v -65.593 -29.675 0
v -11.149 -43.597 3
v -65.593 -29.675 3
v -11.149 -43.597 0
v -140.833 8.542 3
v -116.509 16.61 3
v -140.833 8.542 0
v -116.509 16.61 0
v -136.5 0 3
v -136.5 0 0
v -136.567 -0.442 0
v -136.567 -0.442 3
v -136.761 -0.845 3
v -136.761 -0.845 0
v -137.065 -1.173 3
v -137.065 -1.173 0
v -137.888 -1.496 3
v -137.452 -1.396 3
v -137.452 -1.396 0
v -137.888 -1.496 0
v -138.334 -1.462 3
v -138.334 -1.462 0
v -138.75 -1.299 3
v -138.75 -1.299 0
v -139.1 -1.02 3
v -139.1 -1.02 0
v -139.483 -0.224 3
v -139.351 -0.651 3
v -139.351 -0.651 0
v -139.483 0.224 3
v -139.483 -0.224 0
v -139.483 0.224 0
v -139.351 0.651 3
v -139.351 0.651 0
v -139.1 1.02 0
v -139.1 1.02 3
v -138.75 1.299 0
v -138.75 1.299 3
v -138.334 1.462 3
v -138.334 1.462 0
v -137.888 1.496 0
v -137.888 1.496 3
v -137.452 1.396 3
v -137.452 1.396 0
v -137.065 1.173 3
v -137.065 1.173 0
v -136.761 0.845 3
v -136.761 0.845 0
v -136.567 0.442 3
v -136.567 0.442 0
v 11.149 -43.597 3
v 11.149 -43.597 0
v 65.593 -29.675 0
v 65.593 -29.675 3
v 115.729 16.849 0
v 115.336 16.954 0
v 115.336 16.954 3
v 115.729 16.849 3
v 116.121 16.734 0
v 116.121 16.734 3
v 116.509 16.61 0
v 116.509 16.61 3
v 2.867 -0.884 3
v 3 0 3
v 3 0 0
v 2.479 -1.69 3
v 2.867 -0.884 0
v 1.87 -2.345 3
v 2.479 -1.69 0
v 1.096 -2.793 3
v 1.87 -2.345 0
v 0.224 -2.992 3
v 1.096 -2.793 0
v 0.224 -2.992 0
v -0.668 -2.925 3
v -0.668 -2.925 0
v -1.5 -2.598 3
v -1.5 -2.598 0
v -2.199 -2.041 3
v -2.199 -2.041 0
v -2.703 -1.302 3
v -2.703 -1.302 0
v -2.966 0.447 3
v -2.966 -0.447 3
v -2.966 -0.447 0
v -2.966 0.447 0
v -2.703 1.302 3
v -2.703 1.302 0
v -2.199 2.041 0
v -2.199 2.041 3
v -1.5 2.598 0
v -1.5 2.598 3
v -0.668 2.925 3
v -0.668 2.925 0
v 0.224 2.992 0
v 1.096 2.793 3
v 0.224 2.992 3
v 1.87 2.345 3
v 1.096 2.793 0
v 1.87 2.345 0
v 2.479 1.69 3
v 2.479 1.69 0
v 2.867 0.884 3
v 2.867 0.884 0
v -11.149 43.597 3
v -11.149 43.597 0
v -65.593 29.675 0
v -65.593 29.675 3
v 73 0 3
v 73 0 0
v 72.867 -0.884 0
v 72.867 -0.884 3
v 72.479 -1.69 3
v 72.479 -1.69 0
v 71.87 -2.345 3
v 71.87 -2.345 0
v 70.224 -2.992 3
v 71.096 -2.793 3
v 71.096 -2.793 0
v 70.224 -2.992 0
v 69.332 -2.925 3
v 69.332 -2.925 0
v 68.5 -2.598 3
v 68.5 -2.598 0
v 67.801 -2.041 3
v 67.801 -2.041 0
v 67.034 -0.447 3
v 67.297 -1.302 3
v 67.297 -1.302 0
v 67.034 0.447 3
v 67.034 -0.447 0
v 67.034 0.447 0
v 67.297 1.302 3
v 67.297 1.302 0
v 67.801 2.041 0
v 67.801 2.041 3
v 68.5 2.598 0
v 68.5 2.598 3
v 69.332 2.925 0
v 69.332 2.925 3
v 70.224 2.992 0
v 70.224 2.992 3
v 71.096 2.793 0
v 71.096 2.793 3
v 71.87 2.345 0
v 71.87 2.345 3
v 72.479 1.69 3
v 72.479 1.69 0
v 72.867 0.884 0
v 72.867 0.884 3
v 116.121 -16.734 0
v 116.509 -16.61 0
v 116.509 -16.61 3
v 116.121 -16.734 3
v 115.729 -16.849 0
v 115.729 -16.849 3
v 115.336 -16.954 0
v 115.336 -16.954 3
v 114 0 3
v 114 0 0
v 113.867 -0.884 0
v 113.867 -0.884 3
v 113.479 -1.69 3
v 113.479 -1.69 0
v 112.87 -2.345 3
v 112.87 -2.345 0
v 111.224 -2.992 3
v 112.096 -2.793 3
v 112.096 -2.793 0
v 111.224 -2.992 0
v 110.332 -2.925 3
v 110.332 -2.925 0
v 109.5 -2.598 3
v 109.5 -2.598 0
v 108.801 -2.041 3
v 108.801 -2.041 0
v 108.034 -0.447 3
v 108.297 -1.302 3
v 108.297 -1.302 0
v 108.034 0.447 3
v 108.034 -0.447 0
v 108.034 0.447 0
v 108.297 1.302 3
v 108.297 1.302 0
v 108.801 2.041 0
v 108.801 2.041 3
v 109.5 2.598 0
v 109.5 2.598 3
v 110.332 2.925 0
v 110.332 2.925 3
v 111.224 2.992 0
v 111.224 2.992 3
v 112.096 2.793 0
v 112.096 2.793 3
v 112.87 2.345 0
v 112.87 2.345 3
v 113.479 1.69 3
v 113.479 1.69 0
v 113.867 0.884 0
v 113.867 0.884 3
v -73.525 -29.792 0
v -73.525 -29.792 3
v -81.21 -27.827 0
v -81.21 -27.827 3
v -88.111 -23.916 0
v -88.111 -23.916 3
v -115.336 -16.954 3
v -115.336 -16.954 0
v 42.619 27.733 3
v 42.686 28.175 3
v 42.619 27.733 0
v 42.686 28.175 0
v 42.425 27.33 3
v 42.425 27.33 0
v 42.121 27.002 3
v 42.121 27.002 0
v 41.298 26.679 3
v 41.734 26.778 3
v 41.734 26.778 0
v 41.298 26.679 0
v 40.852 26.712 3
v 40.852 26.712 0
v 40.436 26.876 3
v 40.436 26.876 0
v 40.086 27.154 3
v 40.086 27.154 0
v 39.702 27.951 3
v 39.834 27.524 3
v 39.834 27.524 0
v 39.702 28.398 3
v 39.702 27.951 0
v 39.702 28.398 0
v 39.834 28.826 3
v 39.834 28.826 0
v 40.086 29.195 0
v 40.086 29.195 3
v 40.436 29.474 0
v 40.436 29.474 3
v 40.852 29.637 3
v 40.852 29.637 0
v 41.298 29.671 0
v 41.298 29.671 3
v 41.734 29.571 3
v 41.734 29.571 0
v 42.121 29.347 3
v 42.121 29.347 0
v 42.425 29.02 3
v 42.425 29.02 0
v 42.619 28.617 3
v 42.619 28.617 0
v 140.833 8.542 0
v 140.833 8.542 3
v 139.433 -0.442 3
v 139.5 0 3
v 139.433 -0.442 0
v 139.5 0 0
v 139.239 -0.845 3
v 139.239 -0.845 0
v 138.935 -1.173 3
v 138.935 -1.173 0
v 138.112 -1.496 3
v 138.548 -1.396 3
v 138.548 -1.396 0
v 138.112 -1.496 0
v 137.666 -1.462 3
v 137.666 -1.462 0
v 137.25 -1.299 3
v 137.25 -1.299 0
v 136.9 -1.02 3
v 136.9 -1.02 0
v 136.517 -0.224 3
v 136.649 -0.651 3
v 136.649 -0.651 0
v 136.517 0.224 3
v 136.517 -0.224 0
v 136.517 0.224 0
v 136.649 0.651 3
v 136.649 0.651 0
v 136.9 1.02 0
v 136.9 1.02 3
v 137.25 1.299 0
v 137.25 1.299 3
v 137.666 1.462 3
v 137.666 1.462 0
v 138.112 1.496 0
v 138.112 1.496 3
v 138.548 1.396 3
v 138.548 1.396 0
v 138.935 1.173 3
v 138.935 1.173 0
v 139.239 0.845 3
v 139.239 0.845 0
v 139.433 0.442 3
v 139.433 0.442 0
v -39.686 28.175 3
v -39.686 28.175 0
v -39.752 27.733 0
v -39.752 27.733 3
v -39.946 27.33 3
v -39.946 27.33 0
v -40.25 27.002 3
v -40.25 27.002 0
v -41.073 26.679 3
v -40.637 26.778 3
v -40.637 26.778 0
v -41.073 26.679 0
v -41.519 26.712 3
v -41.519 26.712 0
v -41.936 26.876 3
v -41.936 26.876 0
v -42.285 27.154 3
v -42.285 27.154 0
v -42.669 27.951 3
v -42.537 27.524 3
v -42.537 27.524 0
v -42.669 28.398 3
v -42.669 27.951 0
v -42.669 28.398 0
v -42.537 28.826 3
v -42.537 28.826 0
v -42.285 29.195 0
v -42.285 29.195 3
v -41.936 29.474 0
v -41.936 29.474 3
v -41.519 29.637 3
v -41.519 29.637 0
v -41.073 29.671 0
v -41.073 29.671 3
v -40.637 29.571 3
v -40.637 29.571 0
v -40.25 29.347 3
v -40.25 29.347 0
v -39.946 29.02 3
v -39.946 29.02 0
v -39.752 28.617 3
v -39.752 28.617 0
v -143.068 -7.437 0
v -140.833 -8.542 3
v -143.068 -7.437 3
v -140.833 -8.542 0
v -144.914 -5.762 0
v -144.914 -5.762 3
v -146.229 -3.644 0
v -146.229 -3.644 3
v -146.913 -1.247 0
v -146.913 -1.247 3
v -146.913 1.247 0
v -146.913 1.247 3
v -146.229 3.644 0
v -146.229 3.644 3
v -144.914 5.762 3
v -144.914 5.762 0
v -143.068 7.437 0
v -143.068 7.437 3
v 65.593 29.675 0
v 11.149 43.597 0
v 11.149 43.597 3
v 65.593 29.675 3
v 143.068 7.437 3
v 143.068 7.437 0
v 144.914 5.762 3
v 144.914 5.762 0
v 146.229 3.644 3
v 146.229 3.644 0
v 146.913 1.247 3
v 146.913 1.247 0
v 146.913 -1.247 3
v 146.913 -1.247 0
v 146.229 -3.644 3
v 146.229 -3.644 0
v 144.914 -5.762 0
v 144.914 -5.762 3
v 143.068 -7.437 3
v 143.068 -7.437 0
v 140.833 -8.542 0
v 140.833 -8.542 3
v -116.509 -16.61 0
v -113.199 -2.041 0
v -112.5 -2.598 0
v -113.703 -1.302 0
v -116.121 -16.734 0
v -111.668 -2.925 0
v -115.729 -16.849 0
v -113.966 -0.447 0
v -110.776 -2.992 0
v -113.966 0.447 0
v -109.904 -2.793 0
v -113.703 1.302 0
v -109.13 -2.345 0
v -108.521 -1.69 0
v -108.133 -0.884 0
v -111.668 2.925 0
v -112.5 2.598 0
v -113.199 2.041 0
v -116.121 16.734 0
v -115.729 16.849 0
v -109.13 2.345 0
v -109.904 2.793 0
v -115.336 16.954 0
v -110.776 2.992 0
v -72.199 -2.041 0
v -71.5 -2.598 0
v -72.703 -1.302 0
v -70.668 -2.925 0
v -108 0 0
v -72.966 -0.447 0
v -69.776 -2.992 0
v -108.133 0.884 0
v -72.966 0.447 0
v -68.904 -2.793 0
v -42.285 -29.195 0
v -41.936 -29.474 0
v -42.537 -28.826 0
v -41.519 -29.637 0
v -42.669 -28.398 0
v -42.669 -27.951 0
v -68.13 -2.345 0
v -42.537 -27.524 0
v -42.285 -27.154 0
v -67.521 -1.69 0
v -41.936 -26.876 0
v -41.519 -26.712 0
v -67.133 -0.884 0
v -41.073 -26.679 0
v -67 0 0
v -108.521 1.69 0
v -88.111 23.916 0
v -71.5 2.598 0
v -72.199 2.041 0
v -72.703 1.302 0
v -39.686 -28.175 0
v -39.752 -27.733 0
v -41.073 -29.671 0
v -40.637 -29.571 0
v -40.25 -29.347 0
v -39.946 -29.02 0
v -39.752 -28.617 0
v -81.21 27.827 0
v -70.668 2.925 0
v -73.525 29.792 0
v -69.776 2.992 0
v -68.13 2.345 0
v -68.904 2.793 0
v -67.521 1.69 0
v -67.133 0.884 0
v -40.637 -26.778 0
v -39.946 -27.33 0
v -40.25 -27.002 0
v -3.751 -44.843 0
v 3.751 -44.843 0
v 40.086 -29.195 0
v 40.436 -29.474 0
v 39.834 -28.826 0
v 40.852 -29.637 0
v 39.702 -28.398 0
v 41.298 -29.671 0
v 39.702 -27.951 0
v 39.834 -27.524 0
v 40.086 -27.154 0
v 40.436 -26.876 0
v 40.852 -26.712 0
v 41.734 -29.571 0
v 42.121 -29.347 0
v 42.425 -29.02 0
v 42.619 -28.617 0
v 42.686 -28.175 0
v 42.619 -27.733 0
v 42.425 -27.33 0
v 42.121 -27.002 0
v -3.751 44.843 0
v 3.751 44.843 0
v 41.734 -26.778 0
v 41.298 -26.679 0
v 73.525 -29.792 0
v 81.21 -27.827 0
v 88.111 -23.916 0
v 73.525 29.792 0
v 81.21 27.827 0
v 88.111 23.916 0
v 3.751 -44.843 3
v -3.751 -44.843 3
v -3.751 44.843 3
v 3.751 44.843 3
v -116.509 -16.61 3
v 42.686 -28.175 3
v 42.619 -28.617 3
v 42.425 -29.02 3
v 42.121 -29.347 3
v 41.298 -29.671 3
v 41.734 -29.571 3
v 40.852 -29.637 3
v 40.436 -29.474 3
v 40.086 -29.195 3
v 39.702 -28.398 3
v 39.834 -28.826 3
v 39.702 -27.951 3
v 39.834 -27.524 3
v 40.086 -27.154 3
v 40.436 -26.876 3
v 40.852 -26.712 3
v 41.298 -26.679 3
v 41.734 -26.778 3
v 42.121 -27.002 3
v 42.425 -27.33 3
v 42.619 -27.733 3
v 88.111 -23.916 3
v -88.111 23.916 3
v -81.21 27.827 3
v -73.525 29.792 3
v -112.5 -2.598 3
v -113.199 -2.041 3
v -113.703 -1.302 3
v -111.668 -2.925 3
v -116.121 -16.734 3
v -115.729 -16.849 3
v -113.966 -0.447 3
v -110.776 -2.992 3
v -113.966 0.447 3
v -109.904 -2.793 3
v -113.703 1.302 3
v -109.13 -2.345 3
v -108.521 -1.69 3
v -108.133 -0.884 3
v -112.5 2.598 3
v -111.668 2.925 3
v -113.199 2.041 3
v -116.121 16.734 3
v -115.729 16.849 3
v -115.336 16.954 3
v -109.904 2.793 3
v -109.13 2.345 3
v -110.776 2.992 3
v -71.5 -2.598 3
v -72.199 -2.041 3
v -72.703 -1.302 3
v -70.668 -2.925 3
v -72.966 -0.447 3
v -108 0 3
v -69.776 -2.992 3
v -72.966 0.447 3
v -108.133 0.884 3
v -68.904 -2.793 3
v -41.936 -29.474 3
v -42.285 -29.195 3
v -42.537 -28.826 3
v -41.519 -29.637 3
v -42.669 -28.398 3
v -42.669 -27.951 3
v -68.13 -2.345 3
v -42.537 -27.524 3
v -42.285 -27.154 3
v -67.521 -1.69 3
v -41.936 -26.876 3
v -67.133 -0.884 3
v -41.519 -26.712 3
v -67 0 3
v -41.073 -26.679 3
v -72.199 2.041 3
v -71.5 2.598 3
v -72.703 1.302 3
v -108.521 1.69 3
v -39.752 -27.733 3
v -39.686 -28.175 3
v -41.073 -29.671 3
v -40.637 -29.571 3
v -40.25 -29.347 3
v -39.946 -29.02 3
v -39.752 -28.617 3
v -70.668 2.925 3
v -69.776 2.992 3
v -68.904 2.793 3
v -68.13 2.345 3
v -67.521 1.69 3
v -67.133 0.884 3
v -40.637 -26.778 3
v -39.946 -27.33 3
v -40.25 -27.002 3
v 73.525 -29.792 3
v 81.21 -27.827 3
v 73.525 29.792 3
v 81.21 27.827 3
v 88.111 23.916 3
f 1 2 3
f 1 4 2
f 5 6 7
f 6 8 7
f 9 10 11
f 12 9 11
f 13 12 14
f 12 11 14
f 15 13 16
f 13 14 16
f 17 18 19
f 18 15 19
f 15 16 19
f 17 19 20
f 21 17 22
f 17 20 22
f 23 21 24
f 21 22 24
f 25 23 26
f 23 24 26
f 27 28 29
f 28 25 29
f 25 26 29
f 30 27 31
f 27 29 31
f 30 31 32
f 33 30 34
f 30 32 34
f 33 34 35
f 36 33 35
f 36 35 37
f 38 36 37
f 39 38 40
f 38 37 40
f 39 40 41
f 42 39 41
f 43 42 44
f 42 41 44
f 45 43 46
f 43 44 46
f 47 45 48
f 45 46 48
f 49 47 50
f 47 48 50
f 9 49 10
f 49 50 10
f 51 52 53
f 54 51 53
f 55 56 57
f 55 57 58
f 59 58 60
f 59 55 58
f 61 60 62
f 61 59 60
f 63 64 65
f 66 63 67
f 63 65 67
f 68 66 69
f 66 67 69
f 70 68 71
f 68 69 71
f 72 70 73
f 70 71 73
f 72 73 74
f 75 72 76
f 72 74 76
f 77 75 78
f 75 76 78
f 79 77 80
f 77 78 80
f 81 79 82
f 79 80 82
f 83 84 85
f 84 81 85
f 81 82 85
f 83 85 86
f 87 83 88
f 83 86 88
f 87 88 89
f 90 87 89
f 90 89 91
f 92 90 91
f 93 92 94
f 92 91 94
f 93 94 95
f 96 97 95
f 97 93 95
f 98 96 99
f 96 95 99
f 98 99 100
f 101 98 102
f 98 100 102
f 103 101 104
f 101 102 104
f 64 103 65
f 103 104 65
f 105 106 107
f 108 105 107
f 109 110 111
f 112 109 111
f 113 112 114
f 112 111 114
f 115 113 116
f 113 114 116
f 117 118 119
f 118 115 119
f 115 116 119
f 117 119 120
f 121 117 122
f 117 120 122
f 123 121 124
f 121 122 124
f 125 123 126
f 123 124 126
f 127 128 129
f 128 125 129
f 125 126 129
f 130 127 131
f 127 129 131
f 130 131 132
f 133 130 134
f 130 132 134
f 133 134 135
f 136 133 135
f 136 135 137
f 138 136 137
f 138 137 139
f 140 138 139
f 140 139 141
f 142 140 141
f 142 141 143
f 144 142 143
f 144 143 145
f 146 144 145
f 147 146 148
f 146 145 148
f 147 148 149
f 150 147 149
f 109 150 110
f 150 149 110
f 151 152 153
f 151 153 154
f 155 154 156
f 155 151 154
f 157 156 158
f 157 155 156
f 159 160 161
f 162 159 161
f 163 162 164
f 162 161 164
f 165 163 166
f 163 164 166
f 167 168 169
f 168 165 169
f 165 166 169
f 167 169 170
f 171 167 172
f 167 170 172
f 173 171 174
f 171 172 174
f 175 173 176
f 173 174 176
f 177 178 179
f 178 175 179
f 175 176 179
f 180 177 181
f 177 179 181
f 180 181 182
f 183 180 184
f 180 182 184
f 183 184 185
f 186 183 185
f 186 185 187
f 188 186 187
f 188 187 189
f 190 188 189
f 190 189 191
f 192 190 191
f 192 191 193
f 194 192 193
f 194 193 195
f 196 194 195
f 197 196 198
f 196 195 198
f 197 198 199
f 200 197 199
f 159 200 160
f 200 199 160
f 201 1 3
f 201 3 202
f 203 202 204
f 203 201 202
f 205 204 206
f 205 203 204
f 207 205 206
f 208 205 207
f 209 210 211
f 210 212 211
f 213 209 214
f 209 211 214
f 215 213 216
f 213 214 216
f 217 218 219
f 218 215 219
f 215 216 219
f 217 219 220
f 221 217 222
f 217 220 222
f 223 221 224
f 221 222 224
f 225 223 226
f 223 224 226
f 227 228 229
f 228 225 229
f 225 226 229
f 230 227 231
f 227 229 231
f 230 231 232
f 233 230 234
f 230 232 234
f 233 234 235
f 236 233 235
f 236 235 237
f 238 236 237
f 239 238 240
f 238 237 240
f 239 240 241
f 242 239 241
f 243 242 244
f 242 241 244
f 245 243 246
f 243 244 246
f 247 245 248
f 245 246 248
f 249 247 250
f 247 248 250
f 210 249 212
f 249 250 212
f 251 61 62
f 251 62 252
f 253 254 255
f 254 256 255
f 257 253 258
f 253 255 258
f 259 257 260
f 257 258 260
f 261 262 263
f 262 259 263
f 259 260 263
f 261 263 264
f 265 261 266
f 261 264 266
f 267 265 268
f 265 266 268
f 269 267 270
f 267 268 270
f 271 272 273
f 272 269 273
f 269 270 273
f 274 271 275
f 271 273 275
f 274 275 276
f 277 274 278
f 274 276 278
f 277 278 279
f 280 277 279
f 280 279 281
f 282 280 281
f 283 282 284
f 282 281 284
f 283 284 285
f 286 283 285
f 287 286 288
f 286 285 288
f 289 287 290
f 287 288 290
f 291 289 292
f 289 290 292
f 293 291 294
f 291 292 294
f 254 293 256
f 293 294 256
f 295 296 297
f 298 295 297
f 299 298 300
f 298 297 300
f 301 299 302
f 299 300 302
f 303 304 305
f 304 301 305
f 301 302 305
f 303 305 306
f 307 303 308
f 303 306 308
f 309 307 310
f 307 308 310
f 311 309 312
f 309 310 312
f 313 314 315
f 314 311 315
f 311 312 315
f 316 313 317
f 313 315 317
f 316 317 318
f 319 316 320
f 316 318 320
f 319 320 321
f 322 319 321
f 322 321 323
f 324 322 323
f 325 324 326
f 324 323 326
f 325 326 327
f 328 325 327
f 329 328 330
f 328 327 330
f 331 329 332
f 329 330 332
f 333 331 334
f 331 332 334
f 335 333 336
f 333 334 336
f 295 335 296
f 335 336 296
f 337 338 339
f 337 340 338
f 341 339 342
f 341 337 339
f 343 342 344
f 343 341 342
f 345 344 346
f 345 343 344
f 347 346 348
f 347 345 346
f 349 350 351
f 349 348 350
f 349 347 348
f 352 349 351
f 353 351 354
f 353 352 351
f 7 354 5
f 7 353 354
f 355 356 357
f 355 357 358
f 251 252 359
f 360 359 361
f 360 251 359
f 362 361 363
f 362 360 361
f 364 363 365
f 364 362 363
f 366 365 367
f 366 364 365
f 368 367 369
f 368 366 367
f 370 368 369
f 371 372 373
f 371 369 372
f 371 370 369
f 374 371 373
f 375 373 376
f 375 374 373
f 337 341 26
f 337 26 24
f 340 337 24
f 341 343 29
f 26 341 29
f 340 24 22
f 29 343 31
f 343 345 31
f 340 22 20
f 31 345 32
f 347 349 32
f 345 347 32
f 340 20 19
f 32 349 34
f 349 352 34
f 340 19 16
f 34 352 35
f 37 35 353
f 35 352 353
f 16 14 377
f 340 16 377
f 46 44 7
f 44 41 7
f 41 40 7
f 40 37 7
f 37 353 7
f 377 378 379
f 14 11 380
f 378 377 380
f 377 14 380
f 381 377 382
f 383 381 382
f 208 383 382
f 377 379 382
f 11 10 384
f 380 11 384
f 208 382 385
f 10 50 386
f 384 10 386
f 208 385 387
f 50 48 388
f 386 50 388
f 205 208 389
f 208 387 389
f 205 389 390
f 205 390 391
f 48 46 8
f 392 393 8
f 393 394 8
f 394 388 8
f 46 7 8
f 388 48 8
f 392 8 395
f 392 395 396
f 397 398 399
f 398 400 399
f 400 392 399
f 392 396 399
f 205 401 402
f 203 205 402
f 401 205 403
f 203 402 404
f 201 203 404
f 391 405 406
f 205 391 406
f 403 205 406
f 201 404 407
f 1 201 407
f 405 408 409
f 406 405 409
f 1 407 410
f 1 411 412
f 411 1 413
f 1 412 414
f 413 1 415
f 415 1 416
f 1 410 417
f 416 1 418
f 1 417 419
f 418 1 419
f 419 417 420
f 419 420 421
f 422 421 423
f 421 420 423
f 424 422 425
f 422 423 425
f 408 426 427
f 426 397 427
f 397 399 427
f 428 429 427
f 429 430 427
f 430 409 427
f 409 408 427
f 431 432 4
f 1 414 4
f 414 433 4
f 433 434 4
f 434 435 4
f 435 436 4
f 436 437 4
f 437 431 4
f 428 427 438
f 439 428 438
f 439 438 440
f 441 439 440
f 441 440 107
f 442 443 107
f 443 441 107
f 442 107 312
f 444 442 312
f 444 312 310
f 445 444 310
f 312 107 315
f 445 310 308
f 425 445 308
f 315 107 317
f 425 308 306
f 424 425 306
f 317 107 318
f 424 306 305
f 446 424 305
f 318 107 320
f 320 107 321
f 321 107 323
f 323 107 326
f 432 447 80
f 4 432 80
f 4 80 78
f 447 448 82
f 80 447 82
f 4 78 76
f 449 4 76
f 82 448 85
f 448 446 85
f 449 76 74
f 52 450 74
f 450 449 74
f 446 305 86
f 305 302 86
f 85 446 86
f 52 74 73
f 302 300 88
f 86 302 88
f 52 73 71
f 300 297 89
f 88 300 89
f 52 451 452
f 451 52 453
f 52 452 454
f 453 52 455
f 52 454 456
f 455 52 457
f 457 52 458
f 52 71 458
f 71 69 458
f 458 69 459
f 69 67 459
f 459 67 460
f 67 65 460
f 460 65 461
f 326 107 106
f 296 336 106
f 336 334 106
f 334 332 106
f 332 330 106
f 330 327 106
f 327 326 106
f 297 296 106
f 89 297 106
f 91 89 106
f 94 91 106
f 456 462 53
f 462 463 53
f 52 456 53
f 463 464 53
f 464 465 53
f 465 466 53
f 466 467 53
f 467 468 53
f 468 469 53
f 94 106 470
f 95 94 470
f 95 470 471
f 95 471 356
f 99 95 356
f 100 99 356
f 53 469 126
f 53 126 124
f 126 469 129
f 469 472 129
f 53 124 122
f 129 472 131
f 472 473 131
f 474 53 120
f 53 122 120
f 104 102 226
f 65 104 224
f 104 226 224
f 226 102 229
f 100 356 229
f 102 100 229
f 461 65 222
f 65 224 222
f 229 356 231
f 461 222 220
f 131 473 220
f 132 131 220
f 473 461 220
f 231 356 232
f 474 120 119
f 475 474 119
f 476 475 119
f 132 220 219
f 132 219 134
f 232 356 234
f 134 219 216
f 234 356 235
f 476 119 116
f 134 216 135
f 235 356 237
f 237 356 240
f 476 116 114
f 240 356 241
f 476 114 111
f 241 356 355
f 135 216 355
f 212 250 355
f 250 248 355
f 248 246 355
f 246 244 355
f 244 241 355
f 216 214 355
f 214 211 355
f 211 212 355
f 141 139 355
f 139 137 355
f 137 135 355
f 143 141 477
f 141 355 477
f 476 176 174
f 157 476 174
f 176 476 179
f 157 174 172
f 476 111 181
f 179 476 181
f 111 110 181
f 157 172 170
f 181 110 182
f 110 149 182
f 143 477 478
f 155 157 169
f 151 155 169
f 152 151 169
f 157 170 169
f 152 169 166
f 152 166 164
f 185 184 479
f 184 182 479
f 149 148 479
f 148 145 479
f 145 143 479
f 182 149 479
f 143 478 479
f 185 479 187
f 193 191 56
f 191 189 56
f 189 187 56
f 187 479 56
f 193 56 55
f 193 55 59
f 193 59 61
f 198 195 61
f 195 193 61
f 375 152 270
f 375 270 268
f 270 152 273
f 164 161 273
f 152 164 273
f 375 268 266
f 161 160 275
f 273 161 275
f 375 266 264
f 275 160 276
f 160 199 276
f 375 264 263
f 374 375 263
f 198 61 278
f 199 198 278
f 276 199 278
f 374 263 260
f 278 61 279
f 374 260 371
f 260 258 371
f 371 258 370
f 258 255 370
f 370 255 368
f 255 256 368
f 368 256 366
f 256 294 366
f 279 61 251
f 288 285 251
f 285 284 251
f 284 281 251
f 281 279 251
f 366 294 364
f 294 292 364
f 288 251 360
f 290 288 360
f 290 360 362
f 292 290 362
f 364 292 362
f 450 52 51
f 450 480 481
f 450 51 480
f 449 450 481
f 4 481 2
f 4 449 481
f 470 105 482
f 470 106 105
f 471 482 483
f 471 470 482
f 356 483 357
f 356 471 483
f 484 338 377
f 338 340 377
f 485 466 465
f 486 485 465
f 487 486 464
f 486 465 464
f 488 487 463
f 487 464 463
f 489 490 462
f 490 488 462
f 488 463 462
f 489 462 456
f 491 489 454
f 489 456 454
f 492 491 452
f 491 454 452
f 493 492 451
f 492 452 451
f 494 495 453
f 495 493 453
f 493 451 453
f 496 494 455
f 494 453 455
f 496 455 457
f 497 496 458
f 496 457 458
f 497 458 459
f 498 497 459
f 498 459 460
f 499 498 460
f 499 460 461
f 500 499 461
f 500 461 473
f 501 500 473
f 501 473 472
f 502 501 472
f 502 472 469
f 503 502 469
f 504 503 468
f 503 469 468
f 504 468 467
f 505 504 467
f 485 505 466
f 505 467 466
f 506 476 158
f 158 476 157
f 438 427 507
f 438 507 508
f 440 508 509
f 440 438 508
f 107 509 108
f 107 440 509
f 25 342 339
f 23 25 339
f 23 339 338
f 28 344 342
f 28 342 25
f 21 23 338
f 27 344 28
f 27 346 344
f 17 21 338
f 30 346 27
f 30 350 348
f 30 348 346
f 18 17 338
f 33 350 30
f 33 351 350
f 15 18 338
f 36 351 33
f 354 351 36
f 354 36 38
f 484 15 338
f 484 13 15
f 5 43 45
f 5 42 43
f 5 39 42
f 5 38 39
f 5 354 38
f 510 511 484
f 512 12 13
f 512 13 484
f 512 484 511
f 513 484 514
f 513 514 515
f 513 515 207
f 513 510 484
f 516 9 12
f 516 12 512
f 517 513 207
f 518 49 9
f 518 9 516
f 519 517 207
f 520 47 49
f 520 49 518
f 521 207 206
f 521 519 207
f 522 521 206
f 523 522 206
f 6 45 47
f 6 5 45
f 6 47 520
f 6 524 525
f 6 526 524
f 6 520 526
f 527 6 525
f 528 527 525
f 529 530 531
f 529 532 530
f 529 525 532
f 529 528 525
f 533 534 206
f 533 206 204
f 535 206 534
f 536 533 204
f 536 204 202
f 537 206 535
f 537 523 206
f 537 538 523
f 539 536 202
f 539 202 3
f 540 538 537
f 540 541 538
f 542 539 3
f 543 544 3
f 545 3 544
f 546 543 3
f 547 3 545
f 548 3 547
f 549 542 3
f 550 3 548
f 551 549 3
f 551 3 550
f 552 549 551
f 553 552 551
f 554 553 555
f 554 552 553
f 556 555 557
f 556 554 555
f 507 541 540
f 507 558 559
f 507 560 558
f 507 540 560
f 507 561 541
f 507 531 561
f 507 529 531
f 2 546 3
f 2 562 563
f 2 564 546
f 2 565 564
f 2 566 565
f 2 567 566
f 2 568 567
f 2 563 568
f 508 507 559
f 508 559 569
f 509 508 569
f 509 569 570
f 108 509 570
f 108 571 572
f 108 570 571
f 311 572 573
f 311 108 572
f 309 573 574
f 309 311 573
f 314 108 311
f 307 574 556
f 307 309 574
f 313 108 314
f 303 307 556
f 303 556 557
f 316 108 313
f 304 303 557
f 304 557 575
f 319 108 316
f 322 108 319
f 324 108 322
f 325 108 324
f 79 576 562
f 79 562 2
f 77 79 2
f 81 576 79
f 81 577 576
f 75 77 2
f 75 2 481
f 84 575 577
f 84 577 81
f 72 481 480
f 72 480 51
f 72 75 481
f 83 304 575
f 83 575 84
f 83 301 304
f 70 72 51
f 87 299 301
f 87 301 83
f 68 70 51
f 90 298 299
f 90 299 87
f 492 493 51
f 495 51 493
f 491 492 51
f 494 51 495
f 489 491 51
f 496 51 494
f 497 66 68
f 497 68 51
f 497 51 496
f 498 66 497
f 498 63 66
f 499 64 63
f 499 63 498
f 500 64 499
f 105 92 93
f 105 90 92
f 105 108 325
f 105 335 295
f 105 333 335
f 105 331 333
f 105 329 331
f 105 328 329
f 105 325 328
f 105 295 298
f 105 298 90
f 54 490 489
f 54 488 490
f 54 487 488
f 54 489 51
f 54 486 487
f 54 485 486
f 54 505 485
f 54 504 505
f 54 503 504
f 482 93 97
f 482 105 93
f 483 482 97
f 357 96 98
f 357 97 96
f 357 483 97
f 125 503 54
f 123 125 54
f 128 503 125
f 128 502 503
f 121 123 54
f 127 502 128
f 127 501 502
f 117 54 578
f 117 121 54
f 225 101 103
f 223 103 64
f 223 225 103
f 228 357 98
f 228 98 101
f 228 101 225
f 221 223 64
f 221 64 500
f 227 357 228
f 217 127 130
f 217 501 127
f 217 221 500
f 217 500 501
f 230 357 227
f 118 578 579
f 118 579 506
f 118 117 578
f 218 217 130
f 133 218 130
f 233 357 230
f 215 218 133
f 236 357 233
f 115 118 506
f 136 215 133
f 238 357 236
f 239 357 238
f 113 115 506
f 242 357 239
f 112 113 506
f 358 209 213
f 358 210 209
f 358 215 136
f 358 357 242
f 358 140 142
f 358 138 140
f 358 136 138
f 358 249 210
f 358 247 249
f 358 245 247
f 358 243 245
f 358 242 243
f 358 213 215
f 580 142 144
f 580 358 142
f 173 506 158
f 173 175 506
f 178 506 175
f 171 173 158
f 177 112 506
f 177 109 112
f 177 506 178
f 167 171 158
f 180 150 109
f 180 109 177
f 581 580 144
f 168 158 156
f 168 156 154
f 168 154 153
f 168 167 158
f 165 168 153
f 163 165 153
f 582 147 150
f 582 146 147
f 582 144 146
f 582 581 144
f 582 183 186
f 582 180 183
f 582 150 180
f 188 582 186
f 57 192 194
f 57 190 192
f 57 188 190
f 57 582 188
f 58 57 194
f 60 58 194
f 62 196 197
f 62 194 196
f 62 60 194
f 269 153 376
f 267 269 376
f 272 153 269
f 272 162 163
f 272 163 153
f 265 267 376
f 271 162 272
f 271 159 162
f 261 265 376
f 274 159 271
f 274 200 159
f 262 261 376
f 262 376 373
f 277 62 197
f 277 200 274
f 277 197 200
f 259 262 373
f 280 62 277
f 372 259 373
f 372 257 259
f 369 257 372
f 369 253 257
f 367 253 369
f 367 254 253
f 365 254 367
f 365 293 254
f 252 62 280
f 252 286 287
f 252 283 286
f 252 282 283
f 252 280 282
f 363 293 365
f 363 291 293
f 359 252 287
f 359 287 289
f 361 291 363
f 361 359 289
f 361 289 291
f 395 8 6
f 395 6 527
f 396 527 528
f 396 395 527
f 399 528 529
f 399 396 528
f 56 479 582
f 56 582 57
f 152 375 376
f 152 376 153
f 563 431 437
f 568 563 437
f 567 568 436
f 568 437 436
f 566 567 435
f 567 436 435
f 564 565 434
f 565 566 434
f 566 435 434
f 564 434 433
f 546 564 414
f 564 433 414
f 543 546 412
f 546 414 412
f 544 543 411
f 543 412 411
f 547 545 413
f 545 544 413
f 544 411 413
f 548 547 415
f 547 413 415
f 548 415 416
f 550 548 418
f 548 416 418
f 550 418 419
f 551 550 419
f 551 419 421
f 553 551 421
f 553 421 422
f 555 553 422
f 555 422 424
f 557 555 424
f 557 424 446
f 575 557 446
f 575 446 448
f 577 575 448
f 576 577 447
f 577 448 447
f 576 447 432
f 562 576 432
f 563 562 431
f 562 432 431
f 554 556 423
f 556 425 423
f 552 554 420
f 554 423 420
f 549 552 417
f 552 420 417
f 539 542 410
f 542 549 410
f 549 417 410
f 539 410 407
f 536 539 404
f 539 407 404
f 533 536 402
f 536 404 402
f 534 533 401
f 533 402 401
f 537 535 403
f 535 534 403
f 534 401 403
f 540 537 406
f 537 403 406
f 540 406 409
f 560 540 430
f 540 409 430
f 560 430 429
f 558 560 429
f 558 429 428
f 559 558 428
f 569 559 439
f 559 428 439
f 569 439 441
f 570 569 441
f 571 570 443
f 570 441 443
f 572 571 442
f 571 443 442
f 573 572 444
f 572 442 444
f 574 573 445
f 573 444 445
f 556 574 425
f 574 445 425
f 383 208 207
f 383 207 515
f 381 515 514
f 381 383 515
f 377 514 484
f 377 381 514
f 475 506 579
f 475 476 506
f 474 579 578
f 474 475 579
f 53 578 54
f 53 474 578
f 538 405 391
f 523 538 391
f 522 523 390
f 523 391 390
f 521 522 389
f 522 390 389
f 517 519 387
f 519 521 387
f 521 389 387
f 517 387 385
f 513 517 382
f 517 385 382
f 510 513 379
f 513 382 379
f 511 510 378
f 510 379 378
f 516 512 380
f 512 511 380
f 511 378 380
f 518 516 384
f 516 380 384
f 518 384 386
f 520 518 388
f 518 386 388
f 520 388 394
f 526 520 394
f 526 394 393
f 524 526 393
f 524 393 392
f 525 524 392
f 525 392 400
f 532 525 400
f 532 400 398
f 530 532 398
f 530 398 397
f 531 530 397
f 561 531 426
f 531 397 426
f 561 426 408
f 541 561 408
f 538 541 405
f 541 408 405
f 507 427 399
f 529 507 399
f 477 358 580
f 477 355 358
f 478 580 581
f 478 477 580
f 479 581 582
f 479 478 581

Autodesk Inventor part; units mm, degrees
ref_plane "YZ Plane" through (0, 0, 0) normal (1, 0, 0) x (0, 1, 0)
ref_plane "XZ Plane" through (0, 0, 0) normal (0, 1, 0) x (-1, 0, 0)
ref_plane "XY Plane" through (0, 0, 0) normal (0, 0, 1) x (1, 0, 0)
sketch "Sketch1" plane through (0, 0, 0) normal (0, 0, 1) x (1, 0, 0)
  circle A0 centre (0, 0) radius 45
  circle A1 centre (70, 0) radius 30
  circle A2 centre (111, 0) radius 17.5
  circle A3 centre (138, 0) radius 9
  circle A4 centre (-70, 0) radius 30
  circle A5 centre (-111, 0) radius 17.5
  circle A6 centre (-138, 0) radius 9
  line L0 (-11.1486, 43.5971) -> (-115.3356, 16.9544)
  line L1 (11.1486, 43.5971) -> (115.3356, 16.9544)
  line L2 (-116.5093, 16.6102) -> (-140.8333, 8.5424)
  line L3 (116.5093, 16.6102) -> (140.8333, 8.5424)
  line L4 (-11.1486, -43.5971) -> (-115.3356, -16.9544)
  line L5 (11.1486, -43.5971) -> (115.3356, -16.9544)
  line L6 (140.8333, -8.5424) -> (116.5093, -16.6102)
  line L7 (-140.8333, -8.5424) -> (-116.5093, -16.6102)
  circle A7 centre (-138, 0) radius 1.5
  circle A8 centre (-111, 0) radius 3
  circle A9 centre (-70, 0) radius 3
  circle A10 centre (0, 0) radius 3
  circle A11 centre (70, 0) radius 3
  circle A12 centre (111, 0) radius 3
  circle A13 centre (138, 0) radius 1.5
  line L8 (-123.0921, -97.5699) -> (-152.3126, 20.9991) construction
  line L9 (-152.3126, 20.9991) -> (130.841, 90.7804) construction
  line L10 (130.841, 90.7804) -> (160.0615, -27.7887) construction
  line L11 (160.0615, -27.7887) -> (-123.0921, -97.5699) construction
  circle A14 centre (-41.1855, -28.1747) radius 1.5
  circle A15 centre (-41.1855, 28.1747) radius 1.5
  circle A16 centre (41.1855, 28.1747) radius 1.5
  circle A17 centre (41.1855, -28.1747) radius 1.5
  line L12 (0, 45) -> (0, -45)
  line L13 (-37.7402, 24.5088) -> (37.7402, -24.5088)
  line L14 (-37.7402, -24.5088) -> (37.7402, 24.5088)
  line L15 (-45, 0) -> (45, 0)
  point P0 (-88.1111, 23.9163)
  point P1 (-88.1111, -23.9163)
  point P2 (-65.5931, -29.6746)
  point P3 (65.5931, -29.6746)
  point P4 (88.1111, -23.9163)
  point P5 (88.1111, 23.9163)
  point P6 (65.5931, 29.6746)
  point P7 (-65.5931, 29.6746)
  point P8 (0, 0)
  dimension "d0" = 90
  dimension "d1" = 60
  dimension "d2" = 70
  dimension "d3" = 35
  dimension "d4" = 41
  dimension "d5" = 18
  dimension "d6" = 27
  dimension "d7" = 0
  dimension "d8" = 0
  dimension "d9" = 0
  dimension "d10" = 60
  dimension "d11" = 35
  dimension "d12" = 41
  dimension "d13" = 18
  dimension "d16" = 70
  dimension "d17" = 0
  dimension "d18" = 0
  dimension "d19" = 0
  dimension "d20" = 27
  dimension "d23" = 6
  dimension "d24" = 6
  dimension "d25" = 6
  dimension "d26" = 3
  dimension "d27" = 6
  dimension "d28" = 6
  dimension "d29" = 3
  dimension "d109" = 0.5
  dimension "d121" = 7.5
  dimension "d133" = 3
  dimension "d138" = 8.8
  dimension "d139" = 3.4005
  dimension "d140" = 3
  dimension "d141" = 3
  dimension "d142" = 3
  dimension "d143" = 7.5
  dimension "d145" = 8.8
  dimension "d146" = 7.5
  dimension "d148" = 8.8
  dimension "d151" = 8.8
  dimension "d152" = 3.4005
  dimension "d153" = 3.4005
  dimension "d155" = 7.5
  dimension "d156" = 3.4005
  dimension "d157" = 57
  dimension "d159" = 57
extrude "Extrusion1" add sketch "Sketch1" along normal blind 3 contours L14 A10 L12 A0 | A0 L1 A1 | A0 A1 L15 A10 L14 | A1 L1 A2 L5 A0 | A0 L15 A1 | L12 A10 L13 A0 | A1 L1 | A0 A1 L15 | A1 A0 L13 A10 L15 | A0 A4 L0 | L1 A2 A1 | A1 L5 A0 | L13 A0 L12 A10 | A10 L15 A4 A0 L13 | L12 A0 L14 A10 | L14 A0 A4 L15 A10 | L0 A4 | A4 A0 L4 A5 L0 | A2 A1 | A1 A2 | L5 A1 | A0 L4 A4 | L15 A0 A4 | A4 A0 L15 | A4 A5 L0 | A2 L5 A1 | L3 A3 L6 A2 | A5 A4 | A4 A5 | A3 | A4 L4 | A4 L4 A5 | A5 L7 A6 L2 | A6
equation "\"BendRadius\" = Thickness"
equation "\"BendReliefWidth\" = Thickness"
equation "\"BendReliefDepth\" = 0.5 * Thickness"
equation "\"CornerReliefSize\" = 4 * Thickness"
equation "\"MinimumRemnant\" = 2 * Thickness"
equation "\"TransitionRadius\" = BendRadius"
equation "\"JacobiRadiusSize\" = BendRadius"
equation "\"GapSize\" = Thickness"
equation "\"Thickness\" = 3"
properties part number "frame" material "PMMA Plastic"
